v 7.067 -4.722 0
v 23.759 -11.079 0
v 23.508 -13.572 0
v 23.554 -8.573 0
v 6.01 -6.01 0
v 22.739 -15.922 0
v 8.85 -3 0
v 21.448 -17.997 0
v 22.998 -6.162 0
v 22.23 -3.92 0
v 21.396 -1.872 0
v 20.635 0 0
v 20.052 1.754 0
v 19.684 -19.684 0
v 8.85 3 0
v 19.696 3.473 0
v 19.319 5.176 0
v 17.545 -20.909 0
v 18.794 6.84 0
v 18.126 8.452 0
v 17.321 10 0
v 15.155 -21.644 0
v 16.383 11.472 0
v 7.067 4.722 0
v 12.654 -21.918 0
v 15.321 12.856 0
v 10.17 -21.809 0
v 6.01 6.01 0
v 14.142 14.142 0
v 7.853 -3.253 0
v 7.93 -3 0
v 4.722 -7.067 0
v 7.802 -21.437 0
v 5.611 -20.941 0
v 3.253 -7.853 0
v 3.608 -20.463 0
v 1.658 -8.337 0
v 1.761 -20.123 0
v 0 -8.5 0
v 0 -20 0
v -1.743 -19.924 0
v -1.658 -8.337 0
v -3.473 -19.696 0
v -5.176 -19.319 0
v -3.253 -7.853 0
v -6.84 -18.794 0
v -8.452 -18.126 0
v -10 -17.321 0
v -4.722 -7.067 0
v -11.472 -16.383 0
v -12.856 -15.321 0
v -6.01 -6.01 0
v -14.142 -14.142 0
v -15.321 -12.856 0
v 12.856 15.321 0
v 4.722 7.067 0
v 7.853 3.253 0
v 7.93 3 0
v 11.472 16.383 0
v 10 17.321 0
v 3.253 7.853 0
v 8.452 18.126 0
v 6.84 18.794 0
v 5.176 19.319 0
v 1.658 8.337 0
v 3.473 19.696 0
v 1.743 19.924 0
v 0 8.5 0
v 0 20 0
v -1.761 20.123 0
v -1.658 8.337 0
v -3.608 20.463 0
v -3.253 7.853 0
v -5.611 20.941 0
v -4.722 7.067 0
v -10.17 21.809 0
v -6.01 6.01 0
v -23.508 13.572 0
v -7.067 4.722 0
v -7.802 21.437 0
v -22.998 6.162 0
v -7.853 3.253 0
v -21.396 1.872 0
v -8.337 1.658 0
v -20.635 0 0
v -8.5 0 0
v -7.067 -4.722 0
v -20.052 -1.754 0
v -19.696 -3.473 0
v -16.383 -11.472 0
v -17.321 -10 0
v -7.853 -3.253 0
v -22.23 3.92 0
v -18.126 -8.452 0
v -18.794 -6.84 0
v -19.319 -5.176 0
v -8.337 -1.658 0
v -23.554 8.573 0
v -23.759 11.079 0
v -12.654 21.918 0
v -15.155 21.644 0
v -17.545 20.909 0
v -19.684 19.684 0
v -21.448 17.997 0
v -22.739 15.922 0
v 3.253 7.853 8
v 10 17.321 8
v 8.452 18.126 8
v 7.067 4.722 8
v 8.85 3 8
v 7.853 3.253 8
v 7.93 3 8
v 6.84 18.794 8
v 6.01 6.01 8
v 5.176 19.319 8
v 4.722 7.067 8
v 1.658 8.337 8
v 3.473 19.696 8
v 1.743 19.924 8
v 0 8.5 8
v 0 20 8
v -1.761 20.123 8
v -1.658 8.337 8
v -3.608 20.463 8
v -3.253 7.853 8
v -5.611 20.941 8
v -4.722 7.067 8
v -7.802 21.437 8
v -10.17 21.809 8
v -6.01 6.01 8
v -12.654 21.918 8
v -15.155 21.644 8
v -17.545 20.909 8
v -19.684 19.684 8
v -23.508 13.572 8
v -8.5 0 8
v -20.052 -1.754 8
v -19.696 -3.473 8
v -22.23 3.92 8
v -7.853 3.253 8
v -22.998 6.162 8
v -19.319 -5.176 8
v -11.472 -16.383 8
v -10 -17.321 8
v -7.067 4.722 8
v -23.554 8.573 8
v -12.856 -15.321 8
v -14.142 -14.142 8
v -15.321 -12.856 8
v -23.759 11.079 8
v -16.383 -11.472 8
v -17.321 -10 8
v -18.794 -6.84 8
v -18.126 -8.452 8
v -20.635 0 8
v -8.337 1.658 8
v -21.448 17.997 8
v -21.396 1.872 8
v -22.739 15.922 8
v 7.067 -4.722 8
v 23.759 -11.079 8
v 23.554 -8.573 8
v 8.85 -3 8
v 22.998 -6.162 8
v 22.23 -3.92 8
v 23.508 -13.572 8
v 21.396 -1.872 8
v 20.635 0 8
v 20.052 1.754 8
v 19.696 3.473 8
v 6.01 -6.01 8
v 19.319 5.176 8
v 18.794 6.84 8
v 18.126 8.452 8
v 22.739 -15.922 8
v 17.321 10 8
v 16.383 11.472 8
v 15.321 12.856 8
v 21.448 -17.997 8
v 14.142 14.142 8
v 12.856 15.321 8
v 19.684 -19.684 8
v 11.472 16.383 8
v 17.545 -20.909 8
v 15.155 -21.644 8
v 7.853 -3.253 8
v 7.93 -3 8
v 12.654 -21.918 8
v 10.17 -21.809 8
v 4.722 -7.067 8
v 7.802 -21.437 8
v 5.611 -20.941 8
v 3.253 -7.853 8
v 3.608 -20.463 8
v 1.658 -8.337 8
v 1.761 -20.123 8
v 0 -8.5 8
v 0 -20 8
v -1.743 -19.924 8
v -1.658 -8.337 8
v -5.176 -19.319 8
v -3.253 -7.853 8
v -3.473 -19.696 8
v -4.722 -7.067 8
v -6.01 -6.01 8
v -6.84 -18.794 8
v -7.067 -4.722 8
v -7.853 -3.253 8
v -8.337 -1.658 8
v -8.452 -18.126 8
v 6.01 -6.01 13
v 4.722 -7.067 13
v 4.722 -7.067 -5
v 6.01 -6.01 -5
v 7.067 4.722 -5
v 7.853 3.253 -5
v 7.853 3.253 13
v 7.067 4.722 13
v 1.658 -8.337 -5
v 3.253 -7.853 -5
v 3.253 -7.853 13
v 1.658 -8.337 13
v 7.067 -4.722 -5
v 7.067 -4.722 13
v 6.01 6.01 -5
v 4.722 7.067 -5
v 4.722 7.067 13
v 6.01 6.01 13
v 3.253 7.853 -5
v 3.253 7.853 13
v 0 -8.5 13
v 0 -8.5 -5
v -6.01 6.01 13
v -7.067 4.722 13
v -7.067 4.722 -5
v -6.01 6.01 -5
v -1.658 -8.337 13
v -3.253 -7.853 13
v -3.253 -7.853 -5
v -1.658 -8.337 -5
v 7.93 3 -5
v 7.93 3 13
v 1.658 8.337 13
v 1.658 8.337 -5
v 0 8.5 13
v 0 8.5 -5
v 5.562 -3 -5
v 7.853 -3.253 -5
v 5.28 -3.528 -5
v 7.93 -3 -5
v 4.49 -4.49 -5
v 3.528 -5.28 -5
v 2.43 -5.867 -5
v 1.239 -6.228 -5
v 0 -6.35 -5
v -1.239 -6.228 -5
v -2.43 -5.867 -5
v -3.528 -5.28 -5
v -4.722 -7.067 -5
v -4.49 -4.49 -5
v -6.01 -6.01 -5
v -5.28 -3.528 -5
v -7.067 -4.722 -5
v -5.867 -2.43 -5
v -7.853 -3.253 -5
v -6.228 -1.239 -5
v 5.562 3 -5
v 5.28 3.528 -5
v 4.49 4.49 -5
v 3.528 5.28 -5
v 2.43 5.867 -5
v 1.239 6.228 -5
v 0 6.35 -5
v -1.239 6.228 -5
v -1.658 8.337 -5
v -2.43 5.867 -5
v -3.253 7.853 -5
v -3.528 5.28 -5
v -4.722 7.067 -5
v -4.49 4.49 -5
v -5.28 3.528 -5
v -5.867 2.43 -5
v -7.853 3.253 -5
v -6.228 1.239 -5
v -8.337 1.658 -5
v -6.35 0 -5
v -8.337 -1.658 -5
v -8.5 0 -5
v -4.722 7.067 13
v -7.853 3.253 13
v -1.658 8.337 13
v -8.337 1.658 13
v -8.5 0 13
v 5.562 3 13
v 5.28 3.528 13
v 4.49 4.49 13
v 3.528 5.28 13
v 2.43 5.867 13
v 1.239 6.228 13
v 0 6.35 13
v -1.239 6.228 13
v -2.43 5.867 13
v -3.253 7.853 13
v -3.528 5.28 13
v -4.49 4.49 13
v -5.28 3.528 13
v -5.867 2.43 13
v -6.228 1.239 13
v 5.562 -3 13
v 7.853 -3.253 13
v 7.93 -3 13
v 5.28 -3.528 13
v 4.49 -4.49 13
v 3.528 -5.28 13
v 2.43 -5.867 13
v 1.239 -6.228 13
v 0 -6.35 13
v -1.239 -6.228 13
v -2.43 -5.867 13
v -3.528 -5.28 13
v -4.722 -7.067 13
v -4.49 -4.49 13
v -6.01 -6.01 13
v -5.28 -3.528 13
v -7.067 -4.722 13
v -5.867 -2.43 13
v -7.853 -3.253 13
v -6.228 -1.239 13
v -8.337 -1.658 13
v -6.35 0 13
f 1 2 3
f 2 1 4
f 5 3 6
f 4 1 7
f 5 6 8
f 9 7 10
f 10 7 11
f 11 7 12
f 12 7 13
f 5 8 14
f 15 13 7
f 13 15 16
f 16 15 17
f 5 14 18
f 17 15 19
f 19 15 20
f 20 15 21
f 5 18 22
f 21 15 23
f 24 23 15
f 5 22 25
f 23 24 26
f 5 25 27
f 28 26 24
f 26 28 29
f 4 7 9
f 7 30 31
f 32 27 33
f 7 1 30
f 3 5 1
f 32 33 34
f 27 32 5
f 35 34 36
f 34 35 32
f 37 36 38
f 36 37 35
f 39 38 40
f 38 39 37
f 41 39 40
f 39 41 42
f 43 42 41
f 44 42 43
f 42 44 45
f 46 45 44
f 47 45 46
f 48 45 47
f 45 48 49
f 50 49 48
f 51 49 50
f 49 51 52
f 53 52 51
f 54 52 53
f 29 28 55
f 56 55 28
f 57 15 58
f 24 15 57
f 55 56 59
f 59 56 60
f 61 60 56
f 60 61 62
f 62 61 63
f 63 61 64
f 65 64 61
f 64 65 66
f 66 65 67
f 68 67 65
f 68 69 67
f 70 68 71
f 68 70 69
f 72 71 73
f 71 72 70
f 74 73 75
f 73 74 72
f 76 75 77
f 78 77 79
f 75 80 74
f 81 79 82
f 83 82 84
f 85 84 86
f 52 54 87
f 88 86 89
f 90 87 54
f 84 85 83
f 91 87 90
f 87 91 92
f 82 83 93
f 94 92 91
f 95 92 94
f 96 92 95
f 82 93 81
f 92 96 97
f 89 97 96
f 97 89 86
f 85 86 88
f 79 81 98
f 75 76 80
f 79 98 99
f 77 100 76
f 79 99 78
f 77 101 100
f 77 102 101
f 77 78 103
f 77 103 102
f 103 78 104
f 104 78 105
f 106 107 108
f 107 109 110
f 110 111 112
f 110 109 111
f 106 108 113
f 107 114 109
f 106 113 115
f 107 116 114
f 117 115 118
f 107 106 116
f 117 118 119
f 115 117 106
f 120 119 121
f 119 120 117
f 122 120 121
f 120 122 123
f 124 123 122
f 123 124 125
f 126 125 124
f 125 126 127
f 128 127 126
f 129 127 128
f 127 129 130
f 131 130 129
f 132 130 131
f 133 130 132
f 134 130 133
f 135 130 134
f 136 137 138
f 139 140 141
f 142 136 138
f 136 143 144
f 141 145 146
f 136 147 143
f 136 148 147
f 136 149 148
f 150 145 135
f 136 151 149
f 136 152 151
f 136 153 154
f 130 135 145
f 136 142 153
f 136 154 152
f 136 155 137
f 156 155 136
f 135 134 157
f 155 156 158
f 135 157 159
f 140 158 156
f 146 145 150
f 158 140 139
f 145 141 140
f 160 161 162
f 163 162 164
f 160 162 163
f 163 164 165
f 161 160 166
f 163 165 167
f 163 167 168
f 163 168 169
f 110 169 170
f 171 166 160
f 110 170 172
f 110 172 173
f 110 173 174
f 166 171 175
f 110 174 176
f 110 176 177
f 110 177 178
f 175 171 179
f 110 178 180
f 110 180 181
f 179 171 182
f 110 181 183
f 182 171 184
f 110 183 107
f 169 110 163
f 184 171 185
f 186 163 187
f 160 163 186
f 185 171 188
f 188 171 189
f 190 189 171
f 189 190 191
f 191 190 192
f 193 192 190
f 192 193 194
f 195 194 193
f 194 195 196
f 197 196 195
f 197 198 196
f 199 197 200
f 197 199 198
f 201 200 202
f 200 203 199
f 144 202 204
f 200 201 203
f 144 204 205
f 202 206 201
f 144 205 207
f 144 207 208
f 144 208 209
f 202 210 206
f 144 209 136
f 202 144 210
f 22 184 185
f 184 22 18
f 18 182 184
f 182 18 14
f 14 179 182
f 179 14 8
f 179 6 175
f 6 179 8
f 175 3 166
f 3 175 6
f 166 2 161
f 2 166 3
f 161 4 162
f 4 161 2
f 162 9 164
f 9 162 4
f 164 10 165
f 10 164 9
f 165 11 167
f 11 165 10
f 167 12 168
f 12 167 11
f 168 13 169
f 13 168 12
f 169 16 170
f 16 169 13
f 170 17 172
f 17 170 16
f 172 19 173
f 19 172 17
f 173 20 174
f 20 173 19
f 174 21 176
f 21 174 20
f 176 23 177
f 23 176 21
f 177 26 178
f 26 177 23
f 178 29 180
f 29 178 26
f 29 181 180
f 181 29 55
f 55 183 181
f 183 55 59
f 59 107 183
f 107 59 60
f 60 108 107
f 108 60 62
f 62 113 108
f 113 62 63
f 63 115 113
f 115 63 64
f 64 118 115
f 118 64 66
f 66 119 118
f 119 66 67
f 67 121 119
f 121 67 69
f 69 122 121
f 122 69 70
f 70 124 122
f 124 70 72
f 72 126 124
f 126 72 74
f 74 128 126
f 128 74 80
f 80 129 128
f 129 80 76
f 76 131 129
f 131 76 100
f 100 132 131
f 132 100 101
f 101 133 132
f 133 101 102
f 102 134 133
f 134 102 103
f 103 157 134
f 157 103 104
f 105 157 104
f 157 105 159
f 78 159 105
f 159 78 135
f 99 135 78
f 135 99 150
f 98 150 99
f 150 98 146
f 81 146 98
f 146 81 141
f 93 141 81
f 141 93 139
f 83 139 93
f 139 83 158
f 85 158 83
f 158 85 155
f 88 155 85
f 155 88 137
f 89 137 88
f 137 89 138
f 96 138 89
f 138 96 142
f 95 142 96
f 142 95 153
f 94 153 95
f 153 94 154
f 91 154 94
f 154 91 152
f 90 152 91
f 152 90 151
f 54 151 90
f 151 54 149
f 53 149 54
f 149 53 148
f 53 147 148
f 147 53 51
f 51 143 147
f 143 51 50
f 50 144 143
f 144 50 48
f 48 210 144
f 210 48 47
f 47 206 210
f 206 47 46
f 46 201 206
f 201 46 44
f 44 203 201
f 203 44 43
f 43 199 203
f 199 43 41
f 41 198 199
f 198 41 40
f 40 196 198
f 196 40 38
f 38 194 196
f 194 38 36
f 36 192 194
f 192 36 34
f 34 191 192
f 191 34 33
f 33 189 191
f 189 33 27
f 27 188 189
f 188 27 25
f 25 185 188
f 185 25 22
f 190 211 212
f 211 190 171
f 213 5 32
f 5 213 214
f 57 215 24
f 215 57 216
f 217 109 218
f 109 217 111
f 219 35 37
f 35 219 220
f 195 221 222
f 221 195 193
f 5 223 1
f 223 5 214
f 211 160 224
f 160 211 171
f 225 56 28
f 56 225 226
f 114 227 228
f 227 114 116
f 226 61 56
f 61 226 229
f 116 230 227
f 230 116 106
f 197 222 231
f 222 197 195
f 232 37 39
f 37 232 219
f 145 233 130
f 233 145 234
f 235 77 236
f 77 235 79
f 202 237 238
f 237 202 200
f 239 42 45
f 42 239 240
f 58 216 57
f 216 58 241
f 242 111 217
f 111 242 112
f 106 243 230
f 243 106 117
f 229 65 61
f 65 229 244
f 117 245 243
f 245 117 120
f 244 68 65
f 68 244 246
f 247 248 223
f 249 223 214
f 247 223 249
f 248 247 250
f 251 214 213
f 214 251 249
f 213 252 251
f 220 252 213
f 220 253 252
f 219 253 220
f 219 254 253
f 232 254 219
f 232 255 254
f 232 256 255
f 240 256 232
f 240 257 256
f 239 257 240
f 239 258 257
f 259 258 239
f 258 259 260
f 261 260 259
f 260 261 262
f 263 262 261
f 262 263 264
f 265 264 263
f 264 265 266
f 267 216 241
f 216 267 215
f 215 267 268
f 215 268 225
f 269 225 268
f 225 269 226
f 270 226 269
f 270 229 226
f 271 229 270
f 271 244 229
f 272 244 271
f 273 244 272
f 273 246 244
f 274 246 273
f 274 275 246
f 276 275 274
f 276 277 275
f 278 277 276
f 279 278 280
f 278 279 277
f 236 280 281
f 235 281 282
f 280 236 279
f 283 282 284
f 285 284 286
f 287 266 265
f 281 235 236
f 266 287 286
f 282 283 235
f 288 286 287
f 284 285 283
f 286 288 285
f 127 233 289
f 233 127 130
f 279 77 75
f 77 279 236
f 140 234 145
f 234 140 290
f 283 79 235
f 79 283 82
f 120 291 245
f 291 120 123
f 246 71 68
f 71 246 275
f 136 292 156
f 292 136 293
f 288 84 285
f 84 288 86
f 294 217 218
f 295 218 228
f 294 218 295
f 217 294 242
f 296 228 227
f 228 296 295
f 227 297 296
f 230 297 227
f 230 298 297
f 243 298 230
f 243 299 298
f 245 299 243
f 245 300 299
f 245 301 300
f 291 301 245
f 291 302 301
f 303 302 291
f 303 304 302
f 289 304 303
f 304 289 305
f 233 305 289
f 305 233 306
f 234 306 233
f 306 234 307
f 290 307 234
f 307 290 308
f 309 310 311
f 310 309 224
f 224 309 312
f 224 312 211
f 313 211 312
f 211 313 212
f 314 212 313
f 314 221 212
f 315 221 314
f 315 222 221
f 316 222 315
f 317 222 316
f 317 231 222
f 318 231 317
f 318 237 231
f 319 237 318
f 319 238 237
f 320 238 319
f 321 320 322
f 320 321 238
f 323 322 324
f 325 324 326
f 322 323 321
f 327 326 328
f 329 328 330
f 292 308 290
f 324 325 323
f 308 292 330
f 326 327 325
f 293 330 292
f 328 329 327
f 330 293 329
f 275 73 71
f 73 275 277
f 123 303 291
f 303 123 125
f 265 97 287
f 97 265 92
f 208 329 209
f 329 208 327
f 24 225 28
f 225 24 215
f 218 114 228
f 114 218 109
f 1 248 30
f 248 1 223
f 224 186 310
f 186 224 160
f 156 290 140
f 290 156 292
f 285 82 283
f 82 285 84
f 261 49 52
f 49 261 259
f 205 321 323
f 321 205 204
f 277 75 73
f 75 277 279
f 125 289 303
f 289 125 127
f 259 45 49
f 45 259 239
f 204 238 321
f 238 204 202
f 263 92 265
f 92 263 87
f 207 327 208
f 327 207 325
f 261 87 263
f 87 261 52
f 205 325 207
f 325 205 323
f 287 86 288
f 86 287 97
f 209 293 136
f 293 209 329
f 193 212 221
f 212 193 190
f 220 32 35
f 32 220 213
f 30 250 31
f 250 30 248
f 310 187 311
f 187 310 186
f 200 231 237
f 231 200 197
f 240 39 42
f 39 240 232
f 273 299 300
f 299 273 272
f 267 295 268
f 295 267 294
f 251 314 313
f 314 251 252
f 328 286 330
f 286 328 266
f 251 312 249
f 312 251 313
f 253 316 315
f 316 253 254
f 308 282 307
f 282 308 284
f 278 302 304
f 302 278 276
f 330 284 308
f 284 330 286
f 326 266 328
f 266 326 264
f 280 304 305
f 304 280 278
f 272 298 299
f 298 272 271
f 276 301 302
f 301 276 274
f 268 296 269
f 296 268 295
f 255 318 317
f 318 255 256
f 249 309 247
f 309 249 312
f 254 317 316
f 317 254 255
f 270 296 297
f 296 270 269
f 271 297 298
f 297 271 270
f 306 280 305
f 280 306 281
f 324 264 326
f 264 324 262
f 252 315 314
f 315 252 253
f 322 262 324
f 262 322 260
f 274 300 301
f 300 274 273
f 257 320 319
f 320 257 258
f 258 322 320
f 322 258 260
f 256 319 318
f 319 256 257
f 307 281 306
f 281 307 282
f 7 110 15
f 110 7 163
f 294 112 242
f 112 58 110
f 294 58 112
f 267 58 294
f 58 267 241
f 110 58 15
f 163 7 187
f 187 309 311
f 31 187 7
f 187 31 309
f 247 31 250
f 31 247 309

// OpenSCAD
$fn = 32;

// ----------------------------------------------------------------------
// Cam: base radius 20 mm with a 8 mm lift over 180 degrees
// ----------------------------------------------------------------------

// --- parameters (mm) ---
base_r = 20;              // base radius
lift = 8;                 // lift height above the base radius
lift_span = 180;          // angular width of the lift
lift_start = 90;          // angle where the lift starts
cam_t = 8;                // cam plate thickness
hub_d = 17;               // hub diameter
hub_h = 18;               // hub height
bore_d = 12.7;            // bore
key_w = 6;                // keyway width
key_depth = 1.6;          // keyway depth

cam_profile = [[20.635, 0], [20.052, 1.754], [19.696, 3.473], [19.319, 5.176], [18.794, 6.84], [18.126, 8.452], [17.321, 10], [16.383, 11.472], [15.321, 12.856], [14.142, 14.142], [12.856, 15.321], [11.472, 16.383], [10, 17.321], [8.452, 18.126], [6.84, 18.794], [5.176, 19.319], [3.473, 19.696], [1.743, 19.924], [0, 20], [-1.761, 20.123], [-3.608, 20.463], [-5.611, 20.941], [-7.802, 21.437], [-10.17, 21.809], [-12.654, 21.918], [-15.155, 21.644], [-17.545, 20.909], [-19.684, 19.684], [-21.448, 17.997], [-22.739, 15.922], [-23.508, 13.572], [-23.759, 11.079], [-23.554, 8.573], [-22.998, 6.162], [-22.23, 3.92], [-21.396, 1.872], [-20.635, 0], [-20.052, -1.754], [-19.696, -3.473], [-19.319, -5.176], [-18.794, -6.84], [-18.126, -8.452], [-17.321, -10], [-16.383, -11.472], [-15.321, -12.856], [-14.142, -14.142], [-12.856, -15.321], [-11.472, -16.383], [-10, -17.321], [-8.452, -18.126], [-6.84, -18.794], [-5.176, -19.319], [-3.473, -19.696], [-1.743, -19.924], [0, -20], [1.761, -20.123], [3.608, -20.463], [5.611, -20.941], [7.802, -21.437], [10.17, -21.809], [12.654, -21.918], [15.155, -21.644], [17.545, -20.909], [19.684, -19.684], [21.448, -17.997], [22.739, -15.922], [23.508, -13.572], [23.759, -11.079], [23.554, -8.573], [22.998, -6.162], [22.23, -3.92], [21.396, -1.872]];

difference() {
  union() {
    linear_extrude(height = cam_t) polygon(cam_profile);
    /* hub, proud of the cam plate on both sides */
    translate([0, 0, -5]) cylinder(h = hub_h, d = hub_d);
  }
  /* bore through the hub, 2.5 mm clear on both faces */
  translate([0, 0, -7.5]) cylinder(h = hub_h + 5, d = bore_d);
  /* keyway, milled through the whole hub */
  translate([4.75, -3, -7.5]) cube([4.1, 6, 23]);
}
